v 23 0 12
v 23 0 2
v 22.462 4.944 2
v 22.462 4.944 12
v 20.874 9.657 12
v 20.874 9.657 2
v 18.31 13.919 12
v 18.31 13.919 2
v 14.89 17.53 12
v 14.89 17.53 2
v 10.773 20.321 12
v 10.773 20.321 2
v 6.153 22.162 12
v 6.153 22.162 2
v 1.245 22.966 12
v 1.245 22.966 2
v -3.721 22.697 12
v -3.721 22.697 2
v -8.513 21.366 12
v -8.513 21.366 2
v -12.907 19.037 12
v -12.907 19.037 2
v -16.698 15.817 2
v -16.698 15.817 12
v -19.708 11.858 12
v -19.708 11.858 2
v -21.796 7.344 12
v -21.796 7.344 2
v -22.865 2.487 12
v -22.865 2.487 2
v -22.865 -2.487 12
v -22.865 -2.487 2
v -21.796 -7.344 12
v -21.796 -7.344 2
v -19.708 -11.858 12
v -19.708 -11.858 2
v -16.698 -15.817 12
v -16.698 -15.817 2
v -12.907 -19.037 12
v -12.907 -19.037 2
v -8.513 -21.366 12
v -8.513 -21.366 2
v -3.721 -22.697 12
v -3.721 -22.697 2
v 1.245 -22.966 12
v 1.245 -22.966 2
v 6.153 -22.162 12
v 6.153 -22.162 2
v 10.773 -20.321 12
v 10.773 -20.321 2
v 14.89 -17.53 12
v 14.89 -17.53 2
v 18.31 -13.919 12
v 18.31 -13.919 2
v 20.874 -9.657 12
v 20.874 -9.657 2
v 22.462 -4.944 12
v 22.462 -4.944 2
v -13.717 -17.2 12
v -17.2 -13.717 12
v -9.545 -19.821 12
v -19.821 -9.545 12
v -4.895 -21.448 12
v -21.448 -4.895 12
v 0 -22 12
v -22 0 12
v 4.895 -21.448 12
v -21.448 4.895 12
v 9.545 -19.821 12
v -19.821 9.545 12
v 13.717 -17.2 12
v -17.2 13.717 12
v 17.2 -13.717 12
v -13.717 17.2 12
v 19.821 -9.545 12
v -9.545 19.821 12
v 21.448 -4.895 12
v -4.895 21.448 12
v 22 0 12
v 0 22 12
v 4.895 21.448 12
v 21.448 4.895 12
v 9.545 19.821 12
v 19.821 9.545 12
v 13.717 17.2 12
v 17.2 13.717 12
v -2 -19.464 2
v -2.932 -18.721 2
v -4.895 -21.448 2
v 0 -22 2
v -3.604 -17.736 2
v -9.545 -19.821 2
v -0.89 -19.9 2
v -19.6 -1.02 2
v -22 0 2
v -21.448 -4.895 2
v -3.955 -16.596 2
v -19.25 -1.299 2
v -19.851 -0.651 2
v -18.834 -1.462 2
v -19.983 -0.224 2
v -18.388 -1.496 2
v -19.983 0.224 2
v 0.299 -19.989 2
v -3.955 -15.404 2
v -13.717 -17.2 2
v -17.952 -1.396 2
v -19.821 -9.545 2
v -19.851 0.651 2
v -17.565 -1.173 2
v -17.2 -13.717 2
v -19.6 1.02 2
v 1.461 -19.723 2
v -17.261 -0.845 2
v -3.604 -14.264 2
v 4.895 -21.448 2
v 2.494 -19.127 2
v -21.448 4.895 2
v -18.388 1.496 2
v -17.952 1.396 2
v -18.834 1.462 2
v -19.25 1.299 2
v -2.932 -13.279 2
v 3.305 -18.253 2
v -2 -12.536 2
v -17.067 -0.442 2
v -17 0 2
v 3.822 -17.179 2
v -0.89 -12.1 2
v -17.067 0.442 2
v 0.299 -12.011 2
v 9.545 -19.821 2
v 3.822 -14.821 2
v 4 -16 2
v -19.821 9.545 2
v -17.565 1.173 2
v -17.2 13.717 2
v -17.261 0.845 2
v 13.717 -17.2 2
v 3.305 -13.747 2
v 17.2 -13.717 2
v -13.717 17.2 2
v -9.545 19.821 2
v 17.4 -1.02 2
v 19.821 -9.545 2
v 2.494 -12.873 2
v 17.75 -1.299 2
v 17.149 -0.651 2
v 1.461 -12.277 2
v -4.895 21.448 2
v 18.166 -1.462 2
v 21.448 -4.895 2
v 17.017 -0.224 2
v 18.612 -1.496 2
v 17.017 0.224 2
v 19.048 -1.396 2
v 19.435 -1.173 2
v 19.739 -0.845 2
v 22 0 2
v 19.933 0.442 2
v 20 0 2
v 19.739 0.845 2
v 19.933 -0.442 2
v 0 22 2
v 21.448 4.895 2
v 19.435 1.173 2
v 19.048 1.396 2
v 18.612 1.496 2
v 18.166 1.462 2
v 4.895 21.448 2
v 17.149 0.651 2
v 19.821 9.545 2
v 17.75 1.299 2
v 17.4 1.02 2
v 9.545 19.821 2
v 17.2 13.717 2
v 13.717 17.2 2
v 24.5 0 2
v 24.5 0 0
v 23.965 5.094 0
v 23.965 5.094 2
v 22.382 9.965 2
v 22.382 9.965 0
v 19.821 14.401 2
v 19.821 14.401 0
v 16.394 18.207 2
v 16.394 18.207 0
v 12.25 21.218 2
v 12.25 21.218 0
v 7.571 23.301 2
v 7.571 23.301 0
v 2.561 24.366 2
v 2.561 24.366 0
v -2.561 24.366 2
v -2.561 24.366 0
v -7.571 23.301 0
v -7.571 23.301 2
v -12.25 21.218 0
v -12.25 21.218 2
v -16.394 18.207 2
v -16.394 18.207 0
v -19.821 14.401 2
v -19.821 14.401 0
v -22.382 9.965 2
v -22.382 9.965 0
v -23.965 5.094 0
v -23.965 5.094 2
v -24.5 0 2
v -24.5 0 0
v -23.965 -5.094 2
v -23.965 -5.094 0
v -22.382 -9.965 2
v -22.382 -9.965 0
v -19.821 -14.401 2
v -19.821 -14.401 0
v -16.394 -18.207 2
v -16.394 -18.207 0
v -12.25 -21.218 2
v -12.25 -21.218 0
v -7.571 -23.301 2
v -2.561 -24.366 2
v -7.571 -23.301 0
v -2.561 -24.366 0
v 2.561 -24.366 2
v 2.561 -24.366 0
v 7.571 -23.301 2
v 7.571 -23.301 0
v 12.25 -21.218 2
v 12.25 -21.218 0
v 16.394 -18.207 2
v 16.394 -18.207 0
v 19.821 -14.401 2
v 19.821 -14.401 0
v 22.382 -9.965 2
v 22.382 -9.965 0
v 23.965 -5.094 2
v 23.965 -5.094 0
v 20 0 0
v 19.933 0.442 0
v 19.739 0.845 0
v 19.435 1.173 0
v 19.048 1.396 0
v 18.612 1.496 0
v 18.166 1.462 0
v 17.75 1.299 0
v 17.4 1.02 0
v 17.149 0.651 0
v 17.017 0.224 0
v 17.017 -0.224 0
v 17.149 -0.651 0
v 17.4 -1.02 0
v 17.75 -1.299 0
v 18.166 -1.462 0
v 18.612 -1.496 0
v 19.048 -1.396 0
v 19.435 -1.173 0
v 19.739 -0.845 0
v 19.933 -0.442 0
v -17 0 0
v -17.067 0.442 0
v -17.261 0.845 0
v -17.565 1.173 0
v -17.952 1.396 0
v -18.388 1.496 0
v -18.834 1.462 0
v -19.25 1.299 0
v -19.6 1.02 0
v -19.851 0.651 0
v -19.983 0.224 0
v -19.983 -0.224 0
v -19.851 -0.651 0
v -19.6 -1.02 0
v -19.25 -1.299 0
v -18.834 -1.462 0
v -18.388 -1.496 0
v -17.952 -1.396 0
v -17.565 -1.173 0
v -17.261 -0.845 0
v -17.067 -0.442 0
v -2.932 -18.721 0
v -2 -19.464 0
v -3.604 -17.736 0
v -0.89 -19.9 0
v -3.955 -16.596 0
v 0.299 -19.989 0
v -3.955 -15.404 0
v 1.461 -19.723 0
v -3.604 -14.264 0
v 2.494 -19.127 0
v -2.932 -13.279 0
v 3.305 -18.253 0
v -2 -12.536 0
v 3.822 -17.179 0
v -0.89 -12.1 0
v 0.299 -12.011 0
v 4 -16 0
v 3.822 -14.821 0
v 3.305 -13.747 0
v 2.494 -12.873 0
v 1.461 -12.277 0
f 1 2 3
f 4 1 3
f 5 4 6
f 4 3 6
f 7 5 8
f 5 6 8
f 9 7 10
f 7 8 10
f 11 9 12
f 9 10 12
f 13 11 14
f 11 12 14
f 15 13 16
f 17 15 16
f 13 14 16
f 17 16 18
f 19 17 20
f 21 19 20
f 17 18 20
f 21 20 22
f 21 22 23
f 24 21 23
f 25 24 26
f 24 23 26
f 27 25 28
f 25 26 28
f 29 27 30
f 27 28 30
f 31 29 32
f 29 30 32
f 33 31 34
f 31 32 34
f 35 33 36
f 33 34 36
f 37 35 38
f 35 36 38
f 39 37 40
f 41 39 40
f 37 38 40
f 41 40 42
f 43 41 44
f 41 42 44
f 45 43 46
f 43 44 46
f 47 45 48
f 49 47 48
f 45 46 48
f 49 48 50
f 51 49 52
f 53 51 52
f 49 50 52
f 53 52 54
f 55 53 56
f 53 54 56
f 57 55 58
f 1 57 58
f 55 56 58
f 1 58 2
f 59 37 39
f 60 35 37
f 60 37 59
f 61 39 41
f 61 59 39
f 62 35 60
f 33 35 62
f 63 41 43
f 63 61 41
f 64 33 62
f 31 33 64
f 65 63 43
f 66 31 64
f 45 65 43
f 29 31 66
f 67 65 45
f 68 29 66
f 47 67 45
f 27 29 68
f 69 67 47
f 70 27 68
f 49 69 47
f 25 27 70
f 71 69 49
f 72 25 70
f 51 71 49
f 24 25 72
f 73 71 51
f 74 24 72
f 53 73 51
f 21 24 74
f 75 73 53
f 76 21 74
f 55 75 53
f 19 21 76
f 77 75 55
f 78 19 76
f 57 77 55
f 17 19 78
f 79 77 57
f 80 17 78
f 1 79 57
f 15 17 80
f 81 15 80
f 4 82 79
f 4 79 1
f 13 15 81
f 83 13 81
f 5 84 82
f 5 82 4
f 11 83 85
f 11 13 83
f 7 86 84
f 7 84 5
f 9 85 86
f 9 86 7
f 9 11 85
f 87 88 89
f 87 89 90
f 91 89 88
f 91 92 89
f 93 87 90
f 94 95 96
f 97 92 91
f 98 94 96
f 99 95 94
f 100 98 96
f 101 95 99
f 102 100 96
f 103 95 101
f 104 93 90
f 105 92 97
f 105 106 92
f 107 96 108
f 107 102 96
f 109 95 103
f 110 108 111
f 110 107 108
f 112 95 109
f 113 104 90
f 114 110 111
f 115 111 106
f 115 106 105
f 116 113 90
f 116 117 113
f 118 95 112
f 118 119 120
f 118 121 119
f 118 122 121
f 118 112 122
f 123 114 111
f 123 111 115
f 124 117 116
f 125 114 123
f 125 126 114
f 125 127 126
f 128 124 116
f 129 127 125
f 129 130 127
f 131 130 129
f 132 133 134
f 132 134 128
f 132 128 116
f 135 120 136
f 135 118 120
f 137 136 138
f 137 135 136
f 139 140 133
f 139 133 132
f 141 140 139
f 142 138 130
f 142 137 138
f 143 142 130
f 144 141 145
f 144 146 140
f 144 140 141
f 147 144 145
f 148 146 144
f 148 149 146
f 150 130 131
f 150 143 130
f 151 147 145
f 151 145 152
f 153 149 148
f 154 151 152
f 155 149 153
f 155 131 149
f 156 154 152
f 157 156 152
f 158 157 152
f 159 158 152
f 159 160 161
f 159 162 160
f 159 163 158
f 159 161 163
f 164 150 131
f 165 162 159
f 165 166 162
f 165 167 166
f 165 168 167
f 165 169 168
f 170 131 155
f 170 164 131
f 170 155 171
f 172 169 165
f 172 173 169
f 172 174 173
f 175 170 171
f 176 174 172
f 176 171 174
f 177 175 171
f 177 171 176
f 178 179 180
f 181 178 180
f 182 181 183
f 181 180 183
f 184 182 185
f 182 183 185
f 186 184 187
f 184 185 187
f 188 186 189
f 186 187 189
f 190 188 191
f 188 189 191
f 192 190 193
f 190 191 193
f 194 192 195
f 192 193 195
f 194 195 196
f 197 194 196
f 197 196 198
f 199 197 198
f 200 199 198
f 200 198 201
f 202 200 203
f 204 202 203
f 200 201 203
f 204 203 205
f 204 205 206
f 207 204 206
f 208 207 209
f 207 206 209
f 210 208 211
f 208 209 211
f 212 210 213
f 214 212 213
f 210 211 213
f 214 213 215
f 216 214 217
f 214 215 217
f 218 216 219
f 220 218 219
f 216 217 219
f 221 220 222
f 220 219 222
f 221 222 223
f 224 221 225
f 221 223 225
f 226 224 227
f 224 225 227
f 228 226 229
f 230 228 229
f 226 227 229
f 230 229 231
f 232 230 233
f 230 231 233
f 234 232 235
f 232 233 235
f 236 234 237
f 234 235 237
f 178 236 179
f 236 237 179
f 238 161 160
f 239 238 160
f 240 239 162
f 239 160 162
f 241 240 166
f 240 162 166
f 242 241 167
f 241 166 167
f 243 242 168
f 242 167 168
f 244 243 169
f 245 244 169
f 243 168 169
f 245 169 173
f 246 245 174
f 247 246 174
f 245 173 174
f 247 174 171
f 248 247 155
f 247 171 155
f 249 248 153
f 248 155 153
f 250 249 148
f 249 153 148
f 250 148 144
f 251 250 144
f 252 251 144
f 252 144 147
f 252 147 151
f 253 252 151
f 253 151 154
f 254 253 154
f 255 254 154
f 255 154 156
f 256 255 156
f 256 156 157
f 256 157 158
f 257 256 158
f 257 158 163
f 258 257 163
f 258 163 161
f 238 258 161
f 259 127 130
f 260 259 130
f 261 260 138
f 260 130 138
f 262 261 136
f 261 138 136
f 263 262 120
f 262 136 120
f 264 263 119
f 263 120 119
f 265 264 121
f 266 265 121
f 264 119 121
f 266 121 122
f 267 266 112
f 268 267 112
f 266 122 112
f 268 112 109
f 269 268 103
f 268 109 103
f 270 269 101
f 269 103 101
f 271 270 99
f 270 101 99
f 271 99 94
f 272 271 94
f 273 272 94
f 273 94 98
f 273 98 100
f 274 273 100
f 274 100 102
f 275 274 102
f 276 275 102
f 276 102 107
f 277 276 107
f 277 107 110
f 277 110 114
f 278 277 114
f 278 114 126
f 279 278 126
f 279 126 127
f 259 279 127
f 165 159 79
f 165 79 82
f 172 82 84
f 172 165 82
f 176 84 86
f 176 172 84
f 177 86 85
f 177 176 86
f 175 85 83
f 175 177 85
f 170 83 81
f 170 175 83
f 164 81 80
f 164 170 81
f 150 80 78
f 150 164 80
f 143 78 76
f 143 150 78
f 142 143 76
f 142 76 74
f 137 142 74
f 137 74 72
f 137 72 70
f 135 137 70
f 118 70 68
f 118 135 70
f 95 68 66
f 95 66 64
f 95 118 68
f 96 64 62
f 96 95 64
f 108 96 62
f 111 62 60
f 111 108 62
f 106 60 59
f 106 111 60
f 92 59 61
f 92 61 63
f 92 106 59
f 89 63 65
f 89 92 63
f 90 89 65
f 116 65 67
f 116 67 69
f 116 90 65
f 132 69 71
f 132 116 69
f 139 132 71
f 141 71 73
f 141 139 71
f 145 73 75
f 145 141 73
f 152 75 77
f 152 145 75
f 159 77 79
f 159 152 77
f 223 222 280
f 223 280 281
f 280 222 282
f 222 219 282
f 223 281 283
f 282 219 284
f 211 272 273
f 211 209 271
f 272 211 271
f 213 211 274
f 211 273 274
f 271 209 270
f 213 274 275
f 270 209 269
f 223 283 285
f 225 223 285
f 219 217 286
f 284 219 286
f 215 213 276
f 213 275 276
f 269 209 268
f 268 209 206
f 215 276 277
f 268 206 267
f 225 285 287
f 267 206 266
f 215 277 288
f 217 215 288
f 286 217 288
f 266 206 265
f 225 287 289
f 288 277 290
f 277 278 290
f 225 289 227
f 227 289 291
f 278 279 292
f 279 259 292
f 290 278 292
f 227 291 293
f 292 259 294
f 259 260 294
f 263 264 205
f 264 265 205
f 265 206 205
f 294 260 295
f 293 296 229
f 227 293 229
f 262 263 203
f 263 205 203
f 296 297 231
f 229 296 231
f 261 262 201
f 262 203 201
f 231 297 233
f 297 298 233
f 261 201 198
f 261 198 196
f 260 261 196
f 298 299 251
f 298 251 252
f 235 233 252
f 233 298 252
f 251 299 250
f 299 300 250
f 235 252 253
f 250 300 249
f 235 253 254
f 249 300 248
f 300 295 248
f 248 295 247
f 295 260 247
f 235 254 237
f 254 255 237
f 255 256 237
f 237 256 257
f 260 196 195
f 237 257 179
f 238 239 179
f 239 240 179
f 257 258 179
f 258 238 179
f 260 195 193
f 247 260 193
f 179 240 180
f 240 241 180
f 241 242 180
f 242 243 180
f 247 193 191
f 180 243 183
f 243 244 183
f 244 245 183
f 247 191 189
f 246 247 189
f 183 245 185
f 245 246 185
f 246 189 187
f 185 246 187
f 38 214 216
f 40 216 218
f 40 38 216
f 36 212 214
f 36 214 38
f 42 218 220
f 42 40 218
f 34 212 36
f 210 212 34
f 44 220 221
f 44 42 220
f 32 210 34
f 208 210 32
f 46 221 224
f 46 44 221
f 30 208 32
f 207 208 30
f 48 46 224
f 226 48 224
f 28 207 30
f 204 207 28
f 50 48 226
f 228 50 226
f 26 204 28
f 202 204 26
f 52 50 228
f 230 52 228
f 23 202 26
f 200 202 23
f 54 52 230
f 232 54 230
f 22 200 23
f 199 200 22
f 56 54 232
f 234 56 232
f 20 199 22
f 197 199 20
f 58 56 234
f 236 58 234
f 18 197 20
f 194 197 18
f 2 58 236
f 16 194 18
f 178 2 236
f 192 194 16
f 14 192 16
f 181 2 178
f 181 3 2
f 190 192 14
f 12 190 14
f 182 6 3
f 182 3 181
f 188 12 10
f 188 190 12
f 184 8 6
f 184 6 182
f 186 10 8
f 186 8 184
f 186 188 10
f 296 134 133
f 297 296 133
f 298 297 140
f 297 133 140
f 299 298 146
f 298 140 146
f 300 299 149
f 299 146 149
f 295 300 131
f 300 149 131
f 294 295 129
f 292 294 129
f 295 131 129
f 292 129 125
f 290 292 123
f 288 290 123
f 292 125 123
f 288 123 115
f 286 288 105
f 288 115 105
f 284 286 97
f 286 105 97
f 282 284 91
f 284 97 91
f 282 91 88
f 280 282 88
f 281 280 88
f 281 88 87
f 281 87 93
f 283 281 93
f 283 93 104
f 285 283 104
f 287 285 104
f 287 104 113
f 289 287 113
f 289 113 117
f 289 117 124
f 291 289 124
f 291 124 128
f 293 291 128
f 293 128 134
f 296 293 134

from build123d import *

# Parameters (mm, degrees)
CYLINDER001_R     = 24.5
CYLINDER001_DEPTH = 2
SKETCH_R          = 23
SKETCH_R_2        = 22
PAD_DEPTH         = 10
SKETCH002_R       = 1.5
SKETCH002_R_2     = 4
POCKET001_DEPTH   = 10


with BuildPart() as part:
    # Cylinder001 → Cylinder001 (new body)
    with BuildSketch(Plane.XY):
        Circle(CYLINDER001_R)
    extrude(amount=CYLINDER001_DEPTH)

    # Sketch → Pad (new body)
    with BuildSketch(Plane.XY.offset(2)):
        Circle(SKETCH_R)
        Circle(SKETCH_R_2, mode=Mode.SUBTRACT)
    extrude(amount=PAD_DEPTH)

    # Sketch002 → Pocket001 (cut)
    with BuildSketch(Plane.XY.offset(2)):
        with Locations((-18.5, 0)):
            Circle(SKETCH002_R)
        with Locations((18.5, 0)):
            Circle(SKETCH002_R)
        with Locations((0, -16)):
            Circle(SKETCH002_R_2)
    extrude(amount=-POCKET001_DEPTH, mode=Mode.SUBTRACT)


solid = part.part
